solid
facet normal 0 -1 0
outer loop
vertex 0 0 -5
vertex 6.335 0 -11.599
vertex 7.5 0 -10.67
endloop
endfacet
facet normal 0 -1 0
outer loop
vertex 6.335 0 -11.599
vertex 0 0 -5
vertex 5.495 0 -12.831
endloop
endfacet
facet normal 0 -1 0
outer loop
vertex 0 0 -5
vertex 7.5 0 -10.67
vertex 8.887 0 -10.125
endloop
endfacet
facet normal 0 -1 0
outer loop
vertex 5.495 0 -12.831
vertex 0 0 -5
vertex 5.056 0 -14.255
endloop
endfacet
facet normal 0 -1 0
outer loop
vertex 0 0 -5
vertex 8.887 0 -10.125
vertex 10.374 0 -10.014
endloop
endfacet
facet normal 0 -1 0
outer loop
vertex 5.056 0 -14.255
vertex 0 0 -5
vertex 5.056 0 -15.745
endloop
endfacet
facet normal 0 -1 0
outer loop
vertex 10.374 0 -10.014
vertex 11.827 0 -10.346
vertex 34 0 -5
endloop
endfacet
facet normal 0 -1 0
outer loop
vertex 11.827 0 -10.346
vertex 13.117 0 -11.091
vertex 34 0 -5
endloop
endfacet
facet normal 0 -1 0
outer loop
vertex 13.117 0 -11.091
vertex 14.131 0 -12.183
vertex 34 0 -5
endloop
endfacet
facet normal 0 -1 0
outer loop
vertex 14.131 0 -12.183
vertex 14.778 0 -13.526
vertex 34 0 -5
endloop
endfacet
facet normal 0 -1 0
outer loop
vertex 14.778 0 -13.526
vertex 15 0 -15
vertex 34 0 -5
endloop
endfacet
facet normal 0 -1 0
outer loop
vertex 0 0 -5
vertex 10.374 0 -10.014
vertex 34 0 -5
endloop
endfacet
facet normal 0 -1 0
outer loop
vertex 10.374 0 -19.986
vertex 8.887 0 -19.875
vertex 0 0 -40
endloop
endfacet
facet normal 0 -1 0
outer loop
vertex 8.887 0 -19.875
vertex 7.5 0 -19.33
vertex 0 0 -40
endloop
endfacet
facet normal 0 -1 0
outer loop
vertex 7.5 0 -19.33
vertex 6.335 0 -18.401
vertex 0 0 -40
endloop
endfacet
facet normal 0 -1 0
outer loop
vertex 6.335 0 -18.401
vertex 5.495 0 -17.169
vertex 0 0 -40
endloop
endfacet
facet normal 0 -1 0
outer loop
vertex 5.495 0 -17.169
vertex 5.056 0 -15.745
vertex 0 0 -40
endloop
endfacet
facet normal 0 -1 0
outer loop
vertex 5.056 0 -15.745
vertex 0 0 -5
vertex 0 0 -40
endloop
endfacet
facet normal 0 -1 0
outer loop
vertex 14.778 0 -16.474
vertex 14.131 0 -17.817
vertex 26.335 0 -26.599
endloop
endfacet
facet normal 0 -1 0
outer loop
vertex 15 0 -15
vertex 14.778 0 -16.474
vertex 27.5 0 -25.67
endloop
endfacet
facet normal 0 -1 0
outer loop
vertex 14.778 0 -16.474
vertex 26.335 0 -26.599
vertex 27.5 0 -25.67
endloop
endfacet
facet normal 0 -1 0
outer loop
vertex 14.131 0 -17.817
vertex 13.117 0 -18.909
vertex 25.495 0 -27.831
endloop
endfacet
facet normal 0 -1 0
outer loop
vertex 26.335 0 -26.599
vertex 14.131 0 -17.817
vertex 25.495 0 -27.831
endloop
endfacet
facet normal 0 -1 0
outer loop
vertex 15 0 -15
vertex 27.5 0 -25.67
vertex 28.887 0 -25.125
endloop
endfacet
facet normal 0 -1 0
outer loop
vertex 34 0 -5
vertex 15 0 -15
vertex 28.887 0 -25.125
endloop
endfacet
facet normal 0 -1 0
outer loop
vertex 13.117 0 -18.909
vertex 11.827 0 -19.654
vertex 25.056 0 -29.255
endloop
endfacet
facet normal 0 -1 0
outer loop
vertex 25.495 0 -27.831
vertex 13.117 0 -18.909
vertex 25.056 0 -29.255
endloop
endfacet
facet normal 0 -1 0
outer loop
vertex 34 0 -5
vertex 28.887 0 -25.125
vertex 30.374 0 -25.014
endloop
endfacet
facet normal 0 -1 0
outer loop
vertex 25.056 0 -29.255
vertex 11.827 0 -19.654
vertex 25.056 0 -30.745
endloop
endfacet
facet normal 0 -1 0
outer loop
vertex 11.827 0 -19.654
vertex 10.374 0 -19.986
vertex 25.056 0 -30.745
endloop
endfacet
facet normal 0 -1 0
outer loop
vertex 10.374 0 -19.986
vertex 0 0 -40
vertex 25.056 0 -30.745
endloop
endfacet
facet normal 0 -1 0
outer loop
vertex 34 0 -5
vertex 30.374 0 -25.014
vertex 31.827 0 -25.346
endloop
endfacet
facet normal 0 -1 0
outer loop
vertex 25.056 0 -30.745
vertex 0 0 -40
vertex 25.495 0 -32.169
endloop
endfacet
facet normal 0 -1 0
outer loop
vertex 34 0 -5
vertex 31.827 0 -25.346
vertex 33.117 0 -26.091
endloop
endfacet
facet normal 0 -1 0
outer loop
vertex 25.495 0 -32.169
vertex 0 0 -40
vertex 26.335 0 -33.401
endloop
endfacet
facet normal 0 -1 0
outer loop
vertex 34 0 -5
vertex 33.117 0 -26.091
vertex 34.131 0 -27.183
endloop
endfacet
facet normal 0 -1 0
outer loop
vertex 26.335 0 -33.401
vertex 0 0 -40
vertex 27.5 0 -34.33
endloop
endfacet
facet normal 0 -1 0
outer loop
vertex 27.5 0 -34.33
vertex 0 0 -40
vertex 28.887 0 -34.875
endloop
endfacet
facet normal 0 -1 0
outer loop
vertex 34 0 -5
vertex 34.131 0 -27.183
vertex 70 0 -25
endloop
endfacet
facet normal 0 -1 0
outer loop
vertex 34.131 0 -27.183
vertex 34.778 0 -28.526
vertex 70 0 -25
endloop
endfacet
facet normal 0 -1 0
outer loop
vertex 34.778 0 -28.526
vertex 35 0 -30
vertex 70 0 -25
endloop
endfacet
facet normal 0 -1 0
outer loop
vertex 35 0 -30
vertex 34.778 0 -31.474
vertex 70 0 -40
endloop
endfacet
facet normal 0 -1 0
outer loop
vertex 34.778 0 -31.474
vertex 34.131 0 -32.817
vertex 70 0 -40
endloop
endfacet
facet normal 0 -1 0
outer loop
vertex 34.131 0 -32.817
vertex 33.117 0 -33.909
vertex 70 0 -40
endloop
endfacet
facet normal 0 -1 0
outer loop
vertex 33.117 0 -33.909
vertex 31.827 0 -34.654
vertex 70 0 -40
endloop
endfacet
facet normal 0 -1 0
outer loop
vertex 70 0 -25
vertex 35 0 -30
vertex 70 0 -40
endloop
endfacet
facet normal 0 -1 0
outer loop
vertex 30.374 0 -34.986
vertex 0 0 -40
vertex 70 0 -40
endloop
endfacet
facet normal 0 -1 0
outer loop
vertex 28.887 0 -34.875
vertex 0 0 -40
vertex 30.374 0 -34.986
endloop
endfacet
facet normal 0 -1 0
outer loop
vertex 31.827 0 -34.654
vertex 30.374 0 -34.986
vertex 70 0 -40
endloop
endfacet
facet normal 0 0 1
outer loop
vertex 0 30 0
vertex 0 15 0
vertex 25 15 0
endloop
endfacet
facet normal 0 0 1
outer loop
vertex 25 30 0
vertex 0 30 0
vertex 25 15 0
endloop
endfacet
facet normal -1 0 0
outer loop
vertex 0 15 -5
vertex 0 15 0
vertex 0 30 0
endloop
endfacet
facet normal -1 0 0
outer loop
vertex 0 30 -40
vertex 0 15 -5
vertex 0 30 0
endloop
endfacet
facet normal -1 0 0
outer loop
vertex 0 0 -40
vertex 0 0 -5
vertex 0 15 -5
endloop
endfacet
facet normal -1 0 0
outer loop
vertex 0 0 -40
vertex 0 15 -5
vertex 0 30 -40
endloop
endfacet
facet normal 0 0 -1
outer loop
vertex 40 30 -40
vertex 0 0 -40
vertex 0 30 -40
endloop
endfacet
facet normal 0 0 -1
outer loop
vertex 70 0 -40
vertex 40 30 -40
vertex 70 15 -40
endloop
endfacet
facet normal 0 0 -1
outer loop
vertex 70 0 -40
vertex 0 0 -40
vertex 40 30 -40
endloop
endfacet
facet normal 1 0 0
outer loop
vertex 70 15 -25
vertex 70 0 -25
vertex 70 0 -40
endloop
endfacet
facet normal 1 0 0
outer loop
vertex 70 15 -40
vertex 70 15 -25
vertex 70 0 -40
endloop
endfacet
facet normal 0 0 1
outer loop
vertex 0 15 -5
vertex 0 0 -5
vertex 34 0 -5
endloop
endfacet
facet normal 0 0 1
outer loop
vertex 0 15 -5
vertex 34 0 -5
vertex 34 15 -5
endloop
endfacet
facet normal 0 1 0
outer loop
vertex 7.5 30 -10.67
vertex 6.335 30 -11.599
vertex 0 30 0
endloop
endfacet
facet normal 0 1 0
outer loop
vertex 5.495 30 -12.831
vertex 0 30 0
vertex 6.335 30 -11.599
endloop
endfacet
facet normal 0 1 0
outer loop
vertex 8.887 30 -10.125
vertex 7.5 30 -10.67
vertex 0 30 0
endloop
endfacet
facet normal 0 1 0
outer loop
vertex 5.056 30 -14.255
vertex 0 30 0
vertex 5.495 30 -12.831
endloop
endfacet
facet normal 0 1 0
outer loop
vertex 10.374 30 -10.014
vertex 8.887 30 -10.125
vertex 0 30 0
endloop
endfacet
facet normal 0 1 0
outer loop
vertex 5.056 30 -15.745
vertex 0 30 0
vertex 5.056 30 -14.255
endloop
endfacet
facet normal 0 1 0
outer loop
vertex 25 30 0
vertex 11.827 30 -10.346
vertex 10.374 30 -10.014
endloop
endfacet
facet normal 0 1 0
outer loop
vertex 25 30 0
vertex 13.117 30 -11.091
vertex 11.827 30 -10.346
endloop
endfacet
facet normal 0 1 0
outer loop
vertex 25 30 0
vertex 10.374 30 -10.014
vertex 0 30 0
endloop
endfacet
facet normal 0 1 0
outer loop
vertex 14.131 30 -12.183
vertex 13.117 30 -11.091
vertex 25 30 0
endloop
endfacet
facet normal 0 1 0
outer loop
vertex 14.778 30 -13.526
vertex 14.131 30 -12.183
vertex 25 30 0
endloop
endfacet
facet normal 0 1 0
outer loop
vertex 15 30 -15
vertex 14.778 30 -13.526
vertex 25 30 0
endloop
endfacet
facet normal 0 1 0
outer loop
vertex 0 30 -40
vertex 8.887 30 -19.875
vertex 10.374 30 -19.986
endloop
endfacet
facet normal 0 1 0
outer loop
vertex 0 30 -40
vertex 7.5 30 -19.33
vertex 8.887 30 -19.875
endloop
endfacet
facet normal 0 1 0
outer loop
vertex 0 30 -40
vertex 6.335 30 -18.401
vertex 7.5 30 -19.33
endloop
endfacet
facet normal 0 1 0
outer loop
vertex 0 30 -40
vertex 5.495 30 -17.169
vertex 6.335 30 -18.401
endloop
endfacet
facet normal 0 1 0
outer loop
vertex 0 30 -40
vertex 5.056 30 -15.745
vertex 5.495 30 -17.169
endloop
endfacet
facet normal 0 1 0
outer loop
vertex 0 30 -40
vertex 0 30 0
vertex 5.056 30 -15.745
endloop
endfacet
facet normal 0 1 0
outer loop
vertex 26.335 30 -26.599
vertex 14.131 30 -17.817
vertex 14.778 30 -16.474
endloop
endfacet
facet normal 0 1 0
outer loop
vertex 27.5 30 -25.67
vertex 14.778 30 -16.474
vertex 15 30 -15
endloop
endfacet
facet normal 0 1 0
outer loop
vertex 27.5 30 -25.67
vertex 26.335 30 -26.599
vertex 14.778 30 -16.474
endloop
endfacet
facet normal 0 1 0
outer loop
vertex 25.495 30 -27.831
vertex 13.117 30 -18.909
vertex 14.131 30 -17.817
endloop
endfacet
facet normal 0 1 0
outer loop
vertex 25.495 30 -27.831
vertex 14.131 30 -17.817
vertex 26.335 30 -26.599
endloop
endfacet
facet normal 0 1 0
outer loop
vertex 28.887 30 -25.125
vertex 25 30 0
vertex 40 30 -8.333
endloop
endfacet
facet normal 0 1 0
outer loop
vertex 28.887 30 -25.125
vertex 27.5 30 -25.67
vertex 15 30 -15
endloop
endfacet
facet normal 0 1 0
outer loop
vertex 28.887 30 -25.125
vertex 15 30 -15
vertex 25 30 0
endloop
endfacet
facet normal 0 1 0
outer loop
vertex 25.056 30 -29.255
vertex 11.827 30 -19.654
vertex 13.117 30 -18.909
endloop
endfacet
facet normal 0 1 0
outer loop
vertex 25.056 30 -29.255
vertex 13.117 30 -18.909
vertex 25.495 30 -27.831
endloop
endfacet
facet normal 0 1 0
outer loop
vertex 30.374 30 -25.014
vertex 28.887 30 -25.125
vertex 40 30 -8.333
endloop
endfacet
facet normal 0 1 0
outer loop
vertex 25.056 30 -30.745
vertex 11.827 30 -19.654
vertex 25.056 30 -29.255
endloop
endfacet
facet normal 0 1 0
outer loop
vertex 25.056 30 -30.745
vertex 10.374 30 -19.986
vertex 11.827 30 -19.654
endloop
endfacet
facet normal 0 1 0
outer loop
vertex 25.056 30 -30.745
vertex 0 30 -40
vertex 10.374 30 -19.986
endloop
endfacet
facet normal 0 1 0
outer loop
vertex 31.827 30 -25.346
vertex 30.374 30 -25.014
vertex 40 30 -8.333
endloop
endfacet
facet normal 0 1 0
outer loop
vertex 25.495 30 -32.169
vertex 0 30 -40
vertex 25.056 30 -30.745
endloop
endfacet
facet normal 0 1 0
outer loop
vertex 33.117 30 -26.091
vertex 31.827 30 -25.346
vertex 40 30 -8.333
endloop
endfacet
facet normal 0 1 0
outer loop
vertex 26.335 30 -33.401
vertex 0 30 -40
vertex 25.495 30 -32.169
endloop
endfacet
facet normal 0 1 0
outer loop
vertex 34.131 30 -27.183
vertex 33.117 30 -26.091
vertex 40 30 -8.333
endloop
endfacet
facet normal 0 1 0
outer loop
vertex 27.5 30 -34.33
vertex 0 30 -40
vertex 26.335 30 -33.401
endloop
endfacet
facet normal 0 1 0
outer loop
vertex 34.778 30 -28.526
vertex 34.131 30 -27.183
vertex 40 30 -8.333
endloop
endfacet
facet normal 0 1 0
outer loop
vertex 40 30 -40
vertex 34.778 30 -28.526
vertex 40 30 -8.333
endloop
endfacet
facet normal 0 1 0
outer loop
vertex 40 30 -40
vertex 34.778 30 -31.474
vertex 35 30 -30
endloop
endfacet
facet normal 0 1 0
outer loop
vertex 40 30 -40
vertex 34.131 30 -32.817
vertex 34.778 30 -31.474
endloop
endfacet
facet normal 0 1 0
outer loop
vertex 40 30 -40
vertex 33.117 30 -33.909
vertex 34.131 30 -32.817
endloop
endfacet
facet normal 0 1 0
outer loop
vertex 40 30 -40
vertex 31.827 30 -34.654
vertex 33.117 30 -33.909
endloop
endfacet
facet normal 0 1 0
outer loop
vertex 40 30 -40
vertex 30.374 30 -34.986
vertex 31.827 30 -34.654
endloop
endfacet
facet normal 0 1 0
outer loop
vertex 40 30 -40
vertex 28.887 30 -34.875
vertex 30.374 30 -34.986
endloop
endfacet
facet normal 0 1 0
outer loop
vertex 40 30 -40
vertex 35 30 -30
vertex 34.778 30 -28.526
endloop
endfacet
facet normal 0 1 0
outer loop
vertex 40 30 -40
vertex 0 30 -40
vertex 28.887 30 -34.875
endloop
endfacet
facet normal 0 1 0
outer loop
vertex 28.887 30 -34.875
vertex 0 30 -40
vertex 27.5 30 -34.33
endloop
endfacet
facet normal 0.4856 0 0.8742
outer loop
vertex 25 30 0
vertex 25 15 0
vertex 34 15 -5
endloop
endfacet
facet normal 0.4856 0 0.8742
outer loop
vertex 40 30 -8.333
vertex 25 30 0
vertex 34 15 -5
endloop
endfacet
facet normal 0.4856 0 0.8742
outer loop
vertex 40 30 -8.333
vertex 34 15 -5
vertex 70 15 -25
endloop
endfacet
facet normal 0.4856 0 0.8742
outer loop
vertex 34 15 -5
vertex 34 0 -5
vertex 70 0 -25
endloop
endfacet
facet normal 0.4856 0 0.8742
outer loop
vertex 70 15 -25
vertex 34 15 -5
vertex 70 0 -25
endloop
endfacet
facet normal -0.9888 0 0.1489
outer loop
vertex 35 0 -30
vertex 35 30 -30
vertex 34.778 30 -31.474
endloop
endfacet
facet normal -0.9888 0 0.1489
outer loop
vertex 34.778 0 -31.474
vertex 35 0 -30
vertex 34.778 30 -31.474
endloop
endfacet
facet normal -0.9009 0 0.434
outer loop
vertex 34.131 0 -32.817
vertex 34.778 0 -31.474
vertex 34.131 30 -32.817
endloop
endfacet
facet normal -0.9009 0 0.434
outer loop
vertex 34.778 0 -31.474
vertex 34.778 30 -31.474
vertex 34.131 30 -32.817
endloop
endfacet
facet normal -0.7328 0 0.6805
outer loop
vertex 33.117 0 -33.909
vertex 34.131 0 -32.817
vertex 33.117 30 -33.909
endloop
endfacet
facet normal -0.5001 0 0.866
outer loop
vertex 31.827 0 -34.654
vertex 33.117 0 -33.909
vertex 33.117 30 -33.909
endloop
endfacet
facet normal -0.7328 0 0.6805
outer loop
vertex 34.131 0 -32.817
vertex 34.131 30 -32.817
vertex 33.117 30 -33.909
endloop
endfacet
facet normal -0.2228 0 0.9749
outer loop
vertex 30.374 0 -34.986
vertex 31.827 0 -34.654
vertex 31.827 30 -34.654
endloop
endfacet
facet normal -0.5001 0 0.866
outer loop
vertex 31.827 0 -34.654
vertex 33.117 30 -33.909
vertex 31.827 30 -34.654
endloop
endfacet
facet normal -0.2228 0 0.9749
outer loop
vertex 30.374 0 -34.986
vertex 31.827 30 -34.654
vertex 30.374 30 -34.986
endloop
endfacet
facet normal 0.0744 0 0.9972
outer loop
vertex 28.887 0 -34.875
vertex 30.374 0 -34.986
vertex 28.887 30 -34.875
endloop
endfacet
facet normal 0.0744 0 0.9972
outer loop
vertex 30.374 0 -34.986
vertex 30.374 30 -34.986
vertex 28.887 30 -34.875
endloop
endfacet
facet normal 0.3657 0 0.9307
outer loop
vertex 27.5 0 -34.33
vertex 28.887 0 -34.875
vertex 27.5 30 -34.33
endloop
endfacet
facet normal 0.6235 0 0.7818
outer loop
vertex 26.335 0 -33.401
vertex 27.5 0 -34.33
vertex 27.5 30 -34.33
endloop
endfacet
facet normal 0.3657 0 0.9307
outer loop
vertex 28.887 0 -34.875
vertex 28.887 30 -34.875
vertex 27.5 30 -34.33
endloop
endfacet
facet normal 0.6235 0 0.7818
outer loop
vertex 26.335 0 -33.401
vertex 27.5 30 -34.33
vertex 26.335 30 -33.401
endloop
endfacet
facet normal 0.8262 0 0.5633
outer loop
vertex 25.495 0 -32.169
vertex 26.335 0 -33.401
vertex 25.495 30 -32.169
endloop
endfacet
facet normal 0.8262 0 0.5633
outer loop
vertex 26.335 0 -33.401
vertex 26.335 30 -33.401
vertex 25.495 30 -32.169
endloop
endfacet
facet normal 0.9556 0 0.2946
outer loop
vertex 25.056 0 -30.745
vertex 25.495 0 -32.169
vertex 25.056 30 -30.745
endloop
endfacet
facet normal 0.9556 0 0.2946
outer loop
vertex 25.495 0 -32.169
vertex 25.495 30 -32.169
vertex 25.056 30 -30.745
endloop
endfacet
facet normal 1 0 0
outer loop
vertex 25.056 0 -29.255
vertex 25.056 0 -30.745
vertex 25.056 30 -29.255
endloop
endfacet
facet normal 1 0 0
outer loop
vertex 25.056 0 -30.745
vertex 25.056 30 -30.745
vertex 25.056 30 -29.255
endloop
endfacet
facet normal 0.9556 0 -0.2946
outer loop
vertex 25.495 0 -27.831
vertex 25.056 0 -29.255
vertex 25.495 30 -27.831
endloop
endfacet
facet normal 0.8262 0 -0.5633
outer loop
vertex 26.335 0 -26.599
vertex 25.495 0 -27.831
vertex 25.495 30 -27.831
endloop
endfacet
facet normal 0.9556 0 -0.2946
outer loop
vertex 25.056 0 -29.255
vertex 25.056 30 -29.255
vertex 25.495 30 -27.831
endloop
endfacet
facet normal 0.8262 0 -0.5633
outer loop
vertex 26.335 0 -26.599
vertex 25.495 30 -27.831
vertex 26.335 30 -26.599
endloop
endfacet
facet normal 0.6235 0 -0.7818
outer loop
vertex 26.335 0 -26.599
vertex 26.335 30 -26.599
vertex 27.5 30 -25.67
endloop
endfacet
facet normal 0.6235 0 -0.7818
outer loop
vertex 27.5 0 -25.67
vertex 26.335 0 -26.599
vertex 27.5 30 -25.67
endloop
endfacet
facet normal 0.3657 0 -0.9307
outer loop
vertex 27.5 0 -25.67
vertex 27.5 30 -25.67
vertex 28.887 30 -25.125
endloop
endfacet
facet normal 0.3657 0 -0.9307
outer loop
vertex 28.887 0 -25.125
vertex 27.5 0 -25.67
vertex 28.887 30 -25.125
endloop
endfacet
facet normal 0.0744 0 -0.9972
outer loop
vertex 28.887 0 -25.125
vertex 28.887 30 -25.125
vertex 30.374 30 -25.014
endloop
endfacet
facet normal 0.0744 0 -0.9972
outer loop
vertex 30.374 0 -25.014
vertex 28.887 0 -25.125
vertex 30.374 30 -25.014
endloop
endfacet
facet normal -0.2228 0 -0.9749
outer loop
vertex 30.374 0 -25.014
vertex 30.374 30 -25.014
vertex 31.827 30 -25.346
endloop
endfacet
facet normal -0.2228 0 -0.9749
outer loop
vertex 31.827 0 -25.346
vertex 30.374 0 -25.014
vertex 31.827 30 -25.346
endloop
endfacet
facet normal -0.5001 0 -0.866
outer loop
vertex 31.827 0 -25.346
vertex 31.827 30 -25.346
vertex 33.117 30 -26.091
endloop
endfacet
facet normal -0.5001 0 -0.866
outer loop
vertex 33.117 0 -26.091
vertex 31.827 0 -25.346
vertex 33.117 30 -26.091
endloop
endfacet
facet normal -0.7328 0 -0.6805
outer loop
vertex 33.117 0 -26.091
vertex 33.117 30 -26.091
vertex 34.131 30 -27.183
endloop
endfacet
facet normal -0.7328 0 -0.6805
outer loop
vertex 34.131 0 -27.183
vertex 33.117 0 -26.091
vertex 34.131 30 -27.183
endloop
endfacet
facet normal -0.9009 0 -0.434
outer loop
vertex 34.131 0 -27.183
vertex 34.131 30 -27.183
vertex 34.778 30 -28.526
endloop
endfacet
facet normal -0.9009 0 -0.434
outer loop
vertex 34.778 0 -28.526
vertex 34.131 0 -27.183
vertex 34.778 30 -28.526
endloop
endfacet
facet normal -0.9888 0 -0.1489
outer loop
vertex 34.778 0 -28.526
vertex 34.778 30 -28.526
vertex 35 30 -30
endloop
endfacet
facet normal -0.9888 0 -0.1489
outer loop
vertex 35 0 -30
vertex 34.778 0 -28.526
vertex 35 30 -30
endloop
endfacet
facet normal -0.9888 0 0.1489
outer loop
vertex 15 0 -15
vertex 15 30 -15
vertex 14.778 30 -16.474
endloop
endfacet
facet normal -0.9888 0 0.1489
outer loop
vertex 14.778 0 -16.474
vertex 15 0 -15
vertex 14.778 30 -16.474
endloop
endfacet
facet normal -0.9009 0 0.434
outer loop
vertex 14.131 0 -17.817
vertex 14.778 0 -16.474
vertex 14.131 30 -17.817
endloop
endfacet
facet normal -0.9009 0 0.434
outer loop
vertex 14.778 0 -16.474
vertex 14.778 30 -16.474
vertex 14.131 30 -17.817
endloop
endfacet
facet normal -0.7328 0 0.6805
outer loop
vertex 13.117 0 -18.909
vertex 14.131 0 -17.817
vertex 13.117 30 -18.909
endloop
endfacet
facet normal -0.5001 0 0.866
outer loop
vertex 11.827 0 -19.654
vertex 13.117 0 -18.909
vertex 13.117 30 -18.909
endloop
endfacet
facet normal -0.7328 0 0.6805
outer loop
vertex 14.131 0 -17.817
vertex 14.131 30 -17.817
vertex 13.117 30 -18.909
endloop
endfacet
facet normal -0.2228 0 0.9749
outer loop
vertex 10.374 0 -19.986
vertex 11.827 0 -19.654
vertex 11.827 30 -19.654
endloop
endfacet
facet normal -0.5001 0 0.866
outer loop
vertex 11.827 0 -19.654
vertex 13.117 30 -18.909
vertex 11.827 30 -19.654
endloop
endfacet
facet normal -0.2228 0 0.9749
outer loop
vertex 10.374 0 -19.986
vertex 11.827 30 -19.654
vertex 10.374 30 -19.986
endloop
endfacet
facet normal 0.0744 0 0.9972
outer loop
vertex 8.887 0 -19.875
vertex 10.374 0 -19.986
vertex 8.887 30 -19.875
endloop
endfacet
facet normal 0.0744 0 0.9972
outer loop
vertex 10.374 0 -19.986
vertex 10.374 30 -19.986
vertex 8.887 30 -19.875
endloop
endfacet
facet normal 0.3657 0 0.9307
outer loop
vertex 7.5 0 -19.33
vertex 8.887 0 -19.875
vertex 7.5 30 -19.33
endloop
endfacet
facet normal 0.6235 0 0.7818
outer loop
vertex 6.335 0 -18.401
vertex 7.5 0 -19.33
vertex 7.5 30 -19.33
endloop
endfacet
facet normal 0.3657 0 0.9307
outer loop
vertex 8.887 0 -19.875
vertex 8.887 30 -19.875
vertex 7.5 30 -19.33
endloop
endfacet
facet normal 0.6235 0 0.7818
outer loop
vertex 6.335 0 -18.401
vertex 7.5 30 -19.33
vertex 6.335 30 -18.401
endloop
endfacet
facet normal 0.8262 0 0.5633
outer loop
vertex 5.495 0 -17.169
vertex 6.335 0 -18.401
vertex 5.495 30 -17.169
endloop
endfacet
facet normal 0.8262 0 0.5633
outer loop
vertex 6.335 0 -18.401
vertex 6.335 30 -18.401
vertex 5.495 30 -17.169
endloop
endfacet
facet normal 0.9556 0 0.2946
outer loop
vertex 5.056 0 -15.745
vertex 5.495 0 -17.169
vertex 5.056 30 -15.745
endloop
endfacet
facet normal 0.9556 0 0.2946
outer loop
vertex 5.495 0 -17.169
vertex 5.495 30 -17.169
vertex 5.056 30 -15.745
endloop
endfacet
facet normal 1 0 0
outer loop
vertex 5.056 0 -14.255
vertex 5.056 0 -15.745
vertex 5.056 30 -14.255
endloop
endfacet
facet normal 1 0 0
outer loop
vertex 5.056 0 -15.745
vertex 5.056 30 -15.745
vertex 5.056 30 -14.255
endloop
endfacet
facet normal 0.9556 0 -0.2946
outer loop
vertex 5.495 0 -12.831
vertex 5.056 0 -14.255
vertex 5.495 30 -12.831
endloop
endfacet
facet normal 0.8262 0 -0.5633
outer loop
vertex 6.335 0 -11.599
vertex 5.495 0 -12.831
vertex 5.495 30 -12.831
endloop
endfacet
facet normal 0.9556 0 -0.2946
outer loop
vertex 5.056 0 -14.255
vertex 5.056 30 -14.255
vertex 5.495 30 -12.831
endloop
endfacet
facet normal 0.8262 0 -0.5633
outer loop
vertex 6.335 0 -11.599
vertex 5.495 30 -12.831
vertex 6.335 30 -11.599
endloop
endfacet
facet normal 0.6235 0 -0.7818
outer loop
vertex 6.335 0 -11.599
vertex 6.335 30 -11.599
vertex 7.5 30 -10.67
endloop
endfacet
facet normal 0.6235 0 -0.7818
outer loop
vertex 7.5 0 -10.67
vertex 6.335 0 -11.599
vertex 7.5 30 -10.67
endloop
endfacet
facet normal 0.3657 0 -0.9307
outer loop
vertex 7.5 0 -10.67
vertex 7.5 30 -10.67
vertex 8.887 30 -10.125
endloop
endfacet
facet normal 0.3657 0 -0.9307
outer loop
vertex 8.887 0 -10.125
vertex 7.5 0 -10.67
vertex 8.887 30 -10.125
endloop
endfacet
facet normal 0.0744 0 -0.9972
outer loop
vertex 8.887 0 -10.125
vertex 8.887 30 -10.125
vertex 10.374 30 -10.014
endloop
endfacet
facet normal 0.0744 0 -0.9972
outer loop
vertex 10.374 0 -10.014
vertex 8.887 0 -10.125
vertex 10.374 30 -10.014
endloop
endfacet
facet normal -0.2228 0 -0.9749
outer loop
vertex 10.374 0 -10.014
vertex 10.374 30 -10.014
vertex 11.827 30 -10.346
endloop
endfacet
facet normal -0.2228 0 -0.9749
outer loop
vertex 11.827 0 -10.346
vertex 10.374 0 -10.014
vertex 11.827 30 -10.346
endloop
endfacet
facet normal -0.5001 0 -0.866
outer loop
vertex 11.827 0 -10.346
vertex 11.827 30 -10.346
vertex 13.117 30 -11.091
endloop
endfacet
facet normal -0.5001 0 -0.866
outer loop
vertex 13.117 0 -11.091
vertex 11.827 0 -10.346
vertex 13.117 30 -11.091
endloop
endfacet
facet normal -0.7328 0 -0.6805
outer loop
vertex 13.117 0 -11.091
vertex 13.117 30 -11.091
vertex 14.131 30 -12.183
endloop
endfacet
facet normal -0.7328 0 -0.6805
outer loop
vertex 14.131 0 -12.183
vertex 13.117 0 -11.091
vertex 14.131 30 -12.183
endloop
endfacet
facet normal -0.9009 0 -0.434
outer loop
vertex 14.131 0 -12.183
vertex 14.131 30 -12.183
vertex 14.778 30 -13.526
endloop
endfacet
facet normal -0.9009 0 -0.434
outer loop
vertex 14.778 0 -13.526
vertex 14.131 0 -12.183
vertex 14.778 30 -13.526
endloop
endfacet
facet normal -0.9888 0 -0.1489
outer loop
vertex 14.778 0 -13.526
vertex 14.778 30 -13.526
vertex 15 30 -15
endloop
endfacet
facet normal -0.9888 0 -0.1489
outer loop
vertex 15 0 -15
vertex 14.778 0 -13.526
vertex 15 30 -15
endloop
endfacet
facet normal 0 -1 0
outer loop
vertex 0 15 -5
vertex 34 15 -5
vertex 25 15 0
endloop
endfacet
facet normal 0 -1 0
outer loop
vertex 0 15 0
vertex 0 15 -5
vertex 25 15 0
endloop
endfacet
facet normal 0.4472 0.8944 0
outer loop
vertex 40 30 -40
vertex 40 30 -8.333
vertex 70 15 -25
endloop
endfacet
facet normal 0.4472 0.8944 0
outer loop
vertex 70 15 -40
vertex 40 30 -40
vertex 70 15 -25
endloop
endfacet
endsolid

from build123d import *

# Parameters (mm, degrees)
SKETCH1_W           = 70
SKETCH1_H           = 40
BOSS_EXTRUDE1_DEPTH = 30
CUT_EXTRUDE1_DEPTH  = 41
CUT_EXTRUDE2_DEPTH  = 31
SKETCH5_W           = 5
SKETCH5_H           = 15
CUT_EXTRUDE3_DEPTH  = 71
SKETCH6_R           = 5
CUT_EXTRUDE4_DEPTH  = 31
SKETCH7_R           = 5
CUT_EXTRUDE5_DEPTH  = 31


with BuildPart() as part:
    # Sketch1 → Boss-Extrude1 (new body)
    with BuildSketch(Plane(origin=(0, 0, 0), x_dir=(1, 0, 0), z_dir=(0, 1, 0))):
        with Locations((35, 20)):
            Rectangle(SKETCH1_W, SKETCH1_H)
    extrude(amount=BOSS_EXTRUDE1_DEPTH)

    # Sketch2 → Cut-Extrude1 (cut, through all)
    with BuildSketch(Plane.XY):
        Polygon((70, 30), (40, 30), (70, 15), align=None)
    extrude(amount=-CUT_EXTRUDE1_DEPTH, mode=Mode.SUBTRACT)

    # Sketch4 → Cut-Extrude2 (cut, through all)
    with BuildSketch(Plane(origin=(0, 0, 0), x_dir=(-1, 0, 0), z_dir=(0, -1, 0))):
        Polygon((-25, 0), (-70, 25), (-70, 0), align=None)
    extrude(amount=-CUT_EXTRUDE2_DEPTH, mode=Mode.SUBTRACT)

    # Sketch5 → Cut-Extrude3 (cut, through all)
    with BuildSketch(Plane.ZY):
        with Locations((-2.5, 7.5)):
            Rectangle(SKETCH5_W, SKETCH5_H)
    extrude(amount=-CUT_EXTRUDE3_DEPTH, mode=Mode.SUBTRACT)

    # Sketch6 → Cut-Extrude4 (cut, through all)
    with BuildSketch(Plane(origin=(0, 30, 0), x_dir=(1, 0, 0), z_dir=(0, 1, 0))):
        with Locations((10, 15)):
            Circle(SKETCH6_R)
    extrude(amount=-CUT_EXTRUDE4_DEPTH, mode=Mode.SUBTRACT)

    # Sketch7 → Cut-Extrude5 (cut, through all)
    with BuildSketch(Plane(origin=(0, 30, 0), x_dir=(1, 0, 0), z_dir=(0, 1, 0))):
        with Locations((30, 30)):
            Circle(SKETCH7_R)
    extrude(amount=-CUT_EXTRUDE5_DEPTH, mode=Mode.SUBTRACT)


solid = part.part
